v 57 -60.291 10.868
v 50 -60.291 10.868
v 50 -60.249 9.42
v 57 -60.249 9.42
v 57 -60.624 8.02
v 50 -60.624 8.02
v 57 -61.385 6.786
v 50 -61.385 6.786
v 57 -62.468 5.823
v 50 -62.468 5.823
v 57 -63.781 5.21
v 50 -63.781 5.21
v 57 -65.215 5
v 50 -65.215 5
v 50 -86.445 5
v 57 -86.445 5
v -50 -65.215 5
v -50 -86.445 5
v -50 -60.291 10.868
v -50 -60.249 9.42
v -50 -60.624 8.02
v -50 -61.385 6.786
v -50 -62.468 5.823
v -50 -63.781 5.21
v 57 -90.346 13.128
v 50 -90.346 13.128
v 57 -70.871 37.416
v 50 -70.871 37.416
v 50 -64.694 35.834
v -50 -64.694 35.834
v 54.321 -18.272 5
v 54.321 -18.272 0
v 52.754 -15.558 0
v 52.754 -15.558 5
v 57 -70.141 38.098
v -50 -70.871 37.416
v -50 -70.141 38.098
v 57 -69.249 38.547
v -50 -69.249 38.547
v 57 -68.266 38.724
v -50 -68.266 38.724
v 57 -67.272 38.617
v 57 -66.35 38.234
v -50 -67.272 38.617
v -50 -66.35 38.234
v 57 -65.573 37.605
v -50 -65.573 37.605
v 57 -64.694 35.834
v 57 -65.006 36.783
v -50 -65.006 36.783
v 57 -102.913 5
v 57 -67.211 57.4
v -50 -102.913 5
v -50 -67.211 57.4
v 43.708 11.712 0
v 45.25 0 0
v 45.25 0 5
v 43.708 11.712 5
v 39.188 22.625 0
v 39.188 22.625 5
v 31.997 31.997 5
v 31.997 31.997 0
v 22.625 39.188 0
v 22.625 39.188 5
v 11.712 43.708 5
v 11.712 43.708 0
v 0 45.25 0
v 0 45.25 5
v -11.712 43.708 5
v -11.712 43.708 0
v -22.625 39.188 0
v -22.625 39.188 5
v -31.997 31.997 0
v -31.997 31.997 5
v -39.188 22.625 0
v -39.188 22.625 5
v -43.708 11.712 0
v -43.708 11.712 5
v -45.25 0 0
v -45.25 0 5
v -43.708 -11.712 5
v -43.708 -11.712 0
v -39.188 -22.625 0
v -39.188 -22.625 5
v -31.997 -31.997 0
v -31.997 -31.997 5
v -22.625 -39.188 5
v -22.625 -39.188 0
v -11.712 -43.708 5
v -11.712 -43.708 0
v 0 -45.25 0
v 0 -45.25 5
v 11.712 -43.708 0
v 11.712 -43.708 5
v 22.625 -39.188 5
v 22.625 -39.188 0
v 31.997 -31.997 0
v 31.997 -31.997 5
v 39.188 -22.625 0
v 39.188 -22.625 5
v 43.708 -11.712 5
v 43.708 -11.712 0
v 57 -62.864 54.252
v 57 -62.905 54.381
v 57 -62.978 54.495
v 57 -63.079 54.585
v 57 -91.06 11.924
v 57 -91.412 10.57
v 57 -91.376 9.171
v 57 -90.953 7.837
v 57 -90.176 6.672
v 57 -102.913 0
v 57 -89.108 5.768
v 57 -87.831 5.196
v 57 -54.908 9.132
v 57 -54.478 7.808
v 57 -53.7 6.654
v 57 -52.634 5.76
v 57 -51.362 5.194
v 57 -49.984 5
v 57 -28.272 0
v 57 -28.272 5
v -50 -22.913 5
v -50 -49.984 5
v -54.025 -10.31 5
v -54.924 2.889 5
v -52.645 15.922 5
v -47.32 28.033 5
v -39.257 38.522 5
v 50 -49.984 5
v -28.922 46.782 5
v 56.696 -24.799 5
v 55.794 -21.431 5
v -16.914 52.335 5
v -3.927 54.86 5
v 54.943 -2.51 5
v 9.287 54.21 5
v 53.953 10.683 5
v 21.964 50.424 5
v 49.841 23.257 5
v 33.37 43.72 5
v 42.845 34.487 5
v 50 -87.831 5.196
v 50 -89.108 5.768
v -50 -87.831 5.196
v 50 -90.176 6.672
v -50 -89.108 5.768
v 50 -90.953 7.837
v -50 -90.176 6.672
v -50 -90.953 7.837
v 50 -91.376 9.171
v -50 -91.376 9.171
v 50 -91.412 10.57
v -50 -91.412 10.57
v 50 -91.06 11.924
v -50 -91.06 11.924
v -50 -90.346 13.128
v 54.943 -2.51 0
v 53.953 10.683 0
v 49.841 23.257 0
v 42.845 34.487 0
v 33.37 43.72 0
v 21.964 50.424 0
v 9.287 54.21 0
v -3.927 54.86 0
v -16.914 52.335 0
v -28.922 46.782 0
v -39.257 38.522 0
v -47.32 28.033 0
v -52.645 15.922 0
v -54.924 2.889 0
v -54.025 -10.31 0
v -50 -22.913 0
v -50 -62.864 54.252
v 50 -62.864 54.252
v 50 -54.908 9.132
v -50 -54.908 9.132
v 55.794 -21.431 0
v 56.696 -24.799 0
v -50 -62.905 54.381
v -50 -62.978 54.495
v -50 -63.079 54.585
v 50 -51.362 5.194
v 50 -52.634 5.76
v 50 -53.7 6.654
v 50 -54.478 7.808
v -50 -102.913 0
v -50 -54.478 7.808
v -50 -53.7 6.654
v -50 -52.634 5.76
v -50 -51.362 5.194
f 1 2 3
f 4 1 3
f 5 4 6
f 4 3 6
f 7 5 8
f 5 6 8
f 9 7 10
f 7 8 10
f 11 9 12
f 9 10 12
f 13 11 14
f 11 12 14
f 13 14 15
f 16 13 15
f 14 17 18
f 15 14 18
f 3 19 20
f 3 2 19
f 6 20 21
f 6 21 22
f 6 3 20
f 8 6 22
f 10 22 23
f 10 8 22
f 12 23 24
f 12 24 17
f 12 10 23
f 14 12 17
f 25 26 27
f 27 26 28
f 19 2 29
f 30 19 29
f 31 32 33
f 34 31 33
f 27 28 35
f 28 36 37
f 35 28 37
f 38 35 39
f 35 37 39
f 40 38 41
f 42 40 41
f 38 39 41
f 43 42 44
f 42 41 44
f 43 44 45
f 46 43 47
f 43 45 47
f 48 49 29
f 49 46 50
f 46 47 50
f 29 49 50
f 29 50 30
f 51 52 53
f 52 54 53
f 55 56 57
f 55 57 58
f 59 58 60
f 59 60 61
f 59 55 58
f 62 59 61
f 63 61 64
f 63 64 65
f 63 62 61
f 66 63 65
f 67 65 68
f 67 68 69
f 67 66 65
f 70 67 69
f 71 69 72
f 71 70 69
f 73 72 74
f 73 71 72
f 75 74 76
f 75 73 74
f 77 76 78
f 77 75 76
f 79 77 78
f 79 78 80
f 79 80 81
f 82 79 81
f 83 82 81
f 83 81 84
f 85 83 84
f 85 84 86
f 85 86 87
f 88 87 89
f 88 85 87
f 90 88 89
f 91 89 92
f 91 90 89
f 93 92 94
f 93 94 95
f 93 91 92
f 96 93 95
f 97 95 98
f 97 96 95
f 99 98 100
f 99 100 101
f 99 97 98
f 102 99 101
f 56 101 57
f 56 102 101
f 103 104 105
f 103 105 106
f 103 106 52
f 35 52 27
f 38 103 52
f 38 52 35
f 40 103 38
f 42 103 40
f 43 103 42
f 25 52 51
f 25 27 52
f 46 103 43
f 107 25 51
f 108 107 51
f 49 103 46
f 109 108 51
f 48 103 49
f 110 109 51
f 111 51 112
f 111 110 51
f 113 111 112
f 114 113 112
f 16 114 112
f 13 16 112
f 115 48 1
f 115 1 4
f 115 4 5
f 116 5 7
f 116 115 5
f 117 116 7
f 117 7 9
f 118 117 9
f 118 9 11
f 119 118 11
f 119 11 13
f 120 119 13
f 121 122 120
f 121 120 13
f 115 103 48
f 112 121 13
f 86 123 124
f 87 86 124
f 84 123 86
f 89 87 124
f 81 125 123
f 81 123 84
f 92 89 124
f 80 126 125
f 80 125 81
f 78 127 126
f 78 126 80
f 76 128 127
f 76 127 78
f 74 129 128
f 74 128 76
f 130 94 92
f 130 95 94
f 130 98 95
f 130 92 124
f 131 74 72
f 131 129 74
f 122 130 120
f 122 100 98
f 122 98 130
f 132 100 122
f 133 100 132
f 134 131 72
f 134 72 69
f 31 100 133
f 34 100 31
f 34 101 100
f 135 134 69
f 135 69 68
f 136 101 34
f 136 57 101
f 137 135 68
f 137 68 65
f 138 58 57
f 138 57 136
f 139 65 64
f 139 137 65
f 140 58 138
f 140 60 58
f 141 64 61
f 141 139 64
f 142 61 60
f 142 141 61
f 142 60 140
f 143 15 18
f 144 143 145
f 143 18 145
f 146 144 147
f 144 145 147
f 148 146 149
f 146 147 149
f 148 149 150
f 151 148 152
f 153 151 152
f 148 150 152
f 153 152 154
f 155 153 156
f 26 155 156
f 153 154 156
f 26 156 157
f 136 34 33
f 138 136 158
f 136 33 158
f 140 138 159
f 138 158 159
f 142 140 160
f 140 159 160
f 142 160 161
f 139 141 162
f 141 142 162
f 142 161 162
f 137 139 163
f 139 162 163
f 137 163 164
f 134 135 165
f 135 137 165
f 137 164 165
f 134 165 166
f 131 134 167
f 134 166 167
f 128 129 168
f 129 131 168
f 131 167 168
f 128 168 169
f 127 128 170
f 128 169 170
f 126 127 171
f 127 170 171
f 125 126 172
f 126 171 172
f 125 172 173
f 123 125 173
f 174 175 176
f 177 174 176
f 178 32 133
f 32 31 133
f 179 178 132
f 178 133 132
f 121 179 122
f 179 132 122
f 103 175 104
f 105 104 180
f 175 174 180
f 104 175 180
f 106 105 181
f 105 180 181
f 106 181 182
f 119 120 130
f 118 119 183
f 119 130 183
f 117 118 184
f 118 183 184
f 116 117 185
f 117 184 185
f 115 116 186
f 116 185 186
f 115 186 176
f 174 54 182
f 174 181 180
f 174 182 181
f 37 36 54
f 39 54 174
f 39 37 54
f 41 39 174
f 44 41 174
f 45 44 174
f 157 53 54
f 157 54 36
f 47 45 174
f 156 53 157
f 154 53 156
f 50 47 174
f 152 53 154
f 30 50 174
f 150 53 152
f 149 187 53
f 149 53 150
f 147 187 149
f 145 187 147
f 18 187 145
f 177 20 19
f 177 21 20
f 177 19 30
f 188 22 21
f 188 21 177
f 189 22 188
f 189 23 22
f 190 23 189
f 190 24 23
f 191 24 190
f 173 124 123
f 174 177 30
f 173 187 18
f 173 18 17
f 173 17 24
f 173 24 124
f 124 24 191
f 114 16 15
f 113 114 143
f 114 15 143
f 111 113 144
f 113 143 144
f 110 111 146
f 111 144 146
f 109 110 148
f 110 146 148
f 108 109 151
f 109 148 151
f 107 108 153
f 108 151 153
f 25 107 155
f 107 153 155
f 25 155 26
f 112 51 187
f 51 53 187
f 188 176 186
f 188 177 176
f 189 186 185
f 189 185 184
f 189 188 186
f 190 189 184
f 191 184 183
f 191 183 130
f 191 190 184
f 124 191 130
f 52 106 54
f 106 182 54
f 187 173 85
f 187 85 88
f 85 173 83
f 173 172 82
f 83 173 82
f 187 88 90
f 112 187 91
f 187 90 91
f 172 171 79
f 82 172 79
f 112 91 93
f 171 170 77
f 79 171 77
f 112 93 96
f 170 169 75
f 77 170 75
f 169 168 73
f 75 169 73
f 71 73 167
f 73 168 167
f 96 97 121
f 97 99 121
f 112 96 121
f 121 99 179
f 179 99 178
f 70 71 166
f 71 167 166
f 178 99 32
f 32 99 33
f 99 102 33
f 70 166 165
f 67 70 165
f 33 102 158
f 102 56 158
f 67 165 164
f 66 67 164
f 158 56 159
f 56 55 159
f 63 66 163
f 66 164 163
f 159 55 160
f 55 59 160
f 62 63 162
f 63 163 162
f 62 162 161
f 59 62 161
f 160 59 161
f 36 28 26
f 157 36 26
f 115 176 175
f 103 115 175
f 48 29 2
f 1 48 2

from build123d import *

# Parameters (mm, degrees)
ESQUISSE1_R                    = 55
ESQUISSE1_R_2                  = 45.25
BOSS_EXTRU_1_DEPTH             = 5
BOSS_EXTRU_2_DEPTH             = 5
BOSS_EXTRU_3_REACH             = 118.795
BOSS_EXTRU_3_DIRECTION_2_REACH = 118.795
CONG_1_R                       = 5
CONG_2_R                       = 5
CONG_3_R                       = 5
BOSS_EXTRU_4_DEPTH             = 7
BOSS_EXTRU_5_DEPTH             = 5
CONG_7_R                       = 20


with BuildPart() as part:
    # Esquisse1 → Boss.-Extru.1 (new body)
    with BuildSketch(Plane.XY):
        Circle(ESQUISSE1_R)
        Circle(ESQUISSE1_R_2, mode=Mode.SUBTRACT)
    extrude(amount=BOSS_EXTRU_1_DEPTH)

    # Esquisse2 → Boss.-Extru.2 (add)
    with BuildSketch(Plane(origin=(0, 0, 0), x_dir=(-1, 0, 0), z_dir=(0, 0, -1))):
        with BuildLine():
            Line((-50, -22.912878475), (-50, -102.912878475))
            Line((-50, -102.912878475), (50, -102.912878475))
            Line((50, -102.912878475), (50, -22.912878475))
            ThreePointArc((50, -22.912878475), (0, -55), (-50, -22.912878475))
        make_face()
    extrude(amount=-BOSS_EXTRU_2_DEPTH)

    # Boss.-Extru.3: up to this face of the body (flat: up to its plane)
    boss_extru_3_end = Plane(part.part.faces().sort_by_distance((50, -62.912878475, 2.5))[0])
    # Esquisse3 → Boss.-Extru.3 (add, up to the picked face)
    with BuildSketch(Plane(origin=(0, 0, 0), x_dir=(0, 0, -1), z_dir=(1, 0, 0)), mode=Mode.PRIVATE) as boss_extru_3_sk1:
        with BuildLine():
            Line((-5, -102.912878475), (-57.400351245, -67.211308793))
            Line((-57.400351245, -67.211308793), (-54.585063802, -63.079220143))
            ThreePointArc((-54.585063802, -63.079220143), (-54.440259998, -62.937915144), (-54.251927212, -62.863982707))
            Line((-54.251927212, -62.863982707), (-5, -54.179539087))
            Line((-5, -54.179539087), (-5, -59.256672147))
            Line((-5, -59.256672147), (-35.834324462, -64.693595481))
            ThreePointArc((-35.834324462, -64.693595481), (-38.617179929, -67.272281909), (-37.416008291, -70.871044883))
            Line((-37.416008291, -70.871044883), (-5, -96.86266946))
            Line((-5, -96.86266946), (-5, -102.912878475))
        make_face()
    boss_extru_3_tool1 = split(extrude(boss_extru_3_sk1.sketch, amount=BOSS_EXTRU_3_REACH, mode=Mode.PRIVATE), bisect_by=boss_extru_3_end, keep=Keep.BOTH, mode=Mode.PRIVATE)
    add(boss_extru_3_tool1.solids().sort_by(Axis((0, -84.470715, 30.797256), (1, 0, 0)))[0])

    # Boss.-Extru.3 direction 2: up to this face of the body (flat: up to its plane)
    boss_extru_3_direction_2_end = Plane(part.part.faces().sort_by_distance((-50, -62.912878475, 2.5))[0])
    # Esquisse3 → Boss.-Extru.3 direction 2 (add, up to the picked face)
    with BuildSketch(Plane(origin=(0, 0, 0), x_dir=(0, 0, -1), z_dir=(1, 0, 0)), mode=Mode.PRIVATE) as boss_extru_3_direction_2_sk1:
        with BuildLine():
            Line((-5, -102.912878475), (-57.400351245, -67.211308793))
            Line((-57.400351245, -67.211308793), (-54.585063802, -63.079220143))
            ThreePointArc((-54.585063802, -63.079220143), (-54.440259998, -62.937915144), (-54.251927212, -62.863982707))
            Line((-54.251927212, -62.863982707), (-5, -54.179539087))
            Line((-5, -54.179539087), (-5, -59.256672147))
            Line((-5, -59.256672147), (-35.834324462, -64.693595481))
            ThreePointArc((-35.834324462, -64.693595481), (-38.617179929, -67.272281909), (-37.416008291, -70.871044883))
            Line((-37.416008291, -70.871044883), (-5, -96.86266946))
            Line((-5, -96.86266946), (-5, -102.912878475))
        make_face()
    boss_extru_3_direction_2_tool1 = split(extrude(boss_extru_3_direction_2_sk1.sketch, amount=-BOSS_EXTRU_3_DIRECTION_2_REACH, mode=Mode.PRIVATE), bisect_by=boss_extru_3_direction_2_end, keep=Keep.BOTH, mode=Mode.PRIVATE)
    add(boss_extru_3_direction_2_tool1.solids().sort_by(Axis((0, -84.470715, 30.797256), (-1, 0, 0)))[0])

    # Congé1
    cong_1_edges = [part.edges().sort_by_distance(p)[0] for p in [
        (0, -59.256672147, 5),
    ]]
    fillet(cong_1_edges, radius=CONG_1_R)

    # Congé2
    cong_2_edges = [part.edges().sort_by_distance(p)[0] for p in [
        (0, -54.179539087, 5),
    ]]
    fillet(cong_2_edges, radius=CONG_2_R)

    # Congé3
    cong_3_edges = [part.edges().sort_by_distance(p)[0] for p in [
        (0, -96.86266946, 5),
    ]]
    fillet(cong_3_edges, radius=CONG_3_R)

    # Esquisse5 → Boss.-Extru.4 (add)
    with BuildSketch(Plane(origin=(50, 0, 0), x_dir=(0, 0, -1), z_dir=(1, 0, 0))):
        with BuildLine():
            Line((-9.131759112, -54.908079696), (-54.251927212, -62.863982707))
            ThreePointArc((-54.251927212, -62.863982707), (-54.440259998, -62.937915144), (-54.585063802, -63.079220143))
            Line((-54.585063802, -63.079220143), (-57.400351245, -67.211308793))
            Line((-57.400351245, -67.211308793), (-5, -102.912878475))
            Line((-5, -102.912878475), (0, -102.912878475))
            Line((0, -102.912878475), (0, -22.912878475))
            Line((0, -22.912878475), (-5, -22.912878475))
            Line((-5, -22.912878475), (-5, -49.984040931))
            ThreePointArc((-5, -49.984040931), (-6.169777784, -53.19797898), (-9.131759112, -54.908079696))
        make_face()
        with BuildLine():
            Line((-35.834324462, -64.693595481), (-10.868240888, -60.291401345))
            ThreePointArc((-10.868240888, -60.291401345), (-6.786061952, -61.385217894), (-5, -65.21544011))
            Line((-5, -65.21544011), (-5, -86.444801488))
            ThreePointArc((-5, -86.444801488), (-7.836547445, -90.952514105), (-13.127789216, -90.34569044))
            Line((-13.127789216, -90.34569044), (-37.416008291, -70.871044883))
            ThreePointArc((-37.416008291, -70.871044883), (-38.617179929, -67.272281909), (-35.834324462, -64.693595481))
        make_face(mode=Mode.SUBTRACT)
    extrude(amount=BOSS_EXTRU_4_DEPTH)

    # Esquisse6 → Boss.-Extru.5 (add, through all)
    with BuildSketch(Plane.XY.offset(5)):
        with BuildLine():
            Line((57, -22.912878475), (52.753659593, -15.558001143))
            ThreePointArc((52.753659593, -15.558001143), (51.508273074, -19.284652056), (50, -22.912878475))
            Line((50, -22.912878475), (57, -22.912878475))
        make_face()
    extrude(amount=-BOSS_EXTRU_5_DEPTH)

    # Congé7
    cong_7_edges = [part.edges().sort_by_distance(p)[0] for p in [
        (57, -22.912878475, 2.5),
    ]]
    fillet(cong_7_edges, radius=CONG_7_R)


solid = part.part
